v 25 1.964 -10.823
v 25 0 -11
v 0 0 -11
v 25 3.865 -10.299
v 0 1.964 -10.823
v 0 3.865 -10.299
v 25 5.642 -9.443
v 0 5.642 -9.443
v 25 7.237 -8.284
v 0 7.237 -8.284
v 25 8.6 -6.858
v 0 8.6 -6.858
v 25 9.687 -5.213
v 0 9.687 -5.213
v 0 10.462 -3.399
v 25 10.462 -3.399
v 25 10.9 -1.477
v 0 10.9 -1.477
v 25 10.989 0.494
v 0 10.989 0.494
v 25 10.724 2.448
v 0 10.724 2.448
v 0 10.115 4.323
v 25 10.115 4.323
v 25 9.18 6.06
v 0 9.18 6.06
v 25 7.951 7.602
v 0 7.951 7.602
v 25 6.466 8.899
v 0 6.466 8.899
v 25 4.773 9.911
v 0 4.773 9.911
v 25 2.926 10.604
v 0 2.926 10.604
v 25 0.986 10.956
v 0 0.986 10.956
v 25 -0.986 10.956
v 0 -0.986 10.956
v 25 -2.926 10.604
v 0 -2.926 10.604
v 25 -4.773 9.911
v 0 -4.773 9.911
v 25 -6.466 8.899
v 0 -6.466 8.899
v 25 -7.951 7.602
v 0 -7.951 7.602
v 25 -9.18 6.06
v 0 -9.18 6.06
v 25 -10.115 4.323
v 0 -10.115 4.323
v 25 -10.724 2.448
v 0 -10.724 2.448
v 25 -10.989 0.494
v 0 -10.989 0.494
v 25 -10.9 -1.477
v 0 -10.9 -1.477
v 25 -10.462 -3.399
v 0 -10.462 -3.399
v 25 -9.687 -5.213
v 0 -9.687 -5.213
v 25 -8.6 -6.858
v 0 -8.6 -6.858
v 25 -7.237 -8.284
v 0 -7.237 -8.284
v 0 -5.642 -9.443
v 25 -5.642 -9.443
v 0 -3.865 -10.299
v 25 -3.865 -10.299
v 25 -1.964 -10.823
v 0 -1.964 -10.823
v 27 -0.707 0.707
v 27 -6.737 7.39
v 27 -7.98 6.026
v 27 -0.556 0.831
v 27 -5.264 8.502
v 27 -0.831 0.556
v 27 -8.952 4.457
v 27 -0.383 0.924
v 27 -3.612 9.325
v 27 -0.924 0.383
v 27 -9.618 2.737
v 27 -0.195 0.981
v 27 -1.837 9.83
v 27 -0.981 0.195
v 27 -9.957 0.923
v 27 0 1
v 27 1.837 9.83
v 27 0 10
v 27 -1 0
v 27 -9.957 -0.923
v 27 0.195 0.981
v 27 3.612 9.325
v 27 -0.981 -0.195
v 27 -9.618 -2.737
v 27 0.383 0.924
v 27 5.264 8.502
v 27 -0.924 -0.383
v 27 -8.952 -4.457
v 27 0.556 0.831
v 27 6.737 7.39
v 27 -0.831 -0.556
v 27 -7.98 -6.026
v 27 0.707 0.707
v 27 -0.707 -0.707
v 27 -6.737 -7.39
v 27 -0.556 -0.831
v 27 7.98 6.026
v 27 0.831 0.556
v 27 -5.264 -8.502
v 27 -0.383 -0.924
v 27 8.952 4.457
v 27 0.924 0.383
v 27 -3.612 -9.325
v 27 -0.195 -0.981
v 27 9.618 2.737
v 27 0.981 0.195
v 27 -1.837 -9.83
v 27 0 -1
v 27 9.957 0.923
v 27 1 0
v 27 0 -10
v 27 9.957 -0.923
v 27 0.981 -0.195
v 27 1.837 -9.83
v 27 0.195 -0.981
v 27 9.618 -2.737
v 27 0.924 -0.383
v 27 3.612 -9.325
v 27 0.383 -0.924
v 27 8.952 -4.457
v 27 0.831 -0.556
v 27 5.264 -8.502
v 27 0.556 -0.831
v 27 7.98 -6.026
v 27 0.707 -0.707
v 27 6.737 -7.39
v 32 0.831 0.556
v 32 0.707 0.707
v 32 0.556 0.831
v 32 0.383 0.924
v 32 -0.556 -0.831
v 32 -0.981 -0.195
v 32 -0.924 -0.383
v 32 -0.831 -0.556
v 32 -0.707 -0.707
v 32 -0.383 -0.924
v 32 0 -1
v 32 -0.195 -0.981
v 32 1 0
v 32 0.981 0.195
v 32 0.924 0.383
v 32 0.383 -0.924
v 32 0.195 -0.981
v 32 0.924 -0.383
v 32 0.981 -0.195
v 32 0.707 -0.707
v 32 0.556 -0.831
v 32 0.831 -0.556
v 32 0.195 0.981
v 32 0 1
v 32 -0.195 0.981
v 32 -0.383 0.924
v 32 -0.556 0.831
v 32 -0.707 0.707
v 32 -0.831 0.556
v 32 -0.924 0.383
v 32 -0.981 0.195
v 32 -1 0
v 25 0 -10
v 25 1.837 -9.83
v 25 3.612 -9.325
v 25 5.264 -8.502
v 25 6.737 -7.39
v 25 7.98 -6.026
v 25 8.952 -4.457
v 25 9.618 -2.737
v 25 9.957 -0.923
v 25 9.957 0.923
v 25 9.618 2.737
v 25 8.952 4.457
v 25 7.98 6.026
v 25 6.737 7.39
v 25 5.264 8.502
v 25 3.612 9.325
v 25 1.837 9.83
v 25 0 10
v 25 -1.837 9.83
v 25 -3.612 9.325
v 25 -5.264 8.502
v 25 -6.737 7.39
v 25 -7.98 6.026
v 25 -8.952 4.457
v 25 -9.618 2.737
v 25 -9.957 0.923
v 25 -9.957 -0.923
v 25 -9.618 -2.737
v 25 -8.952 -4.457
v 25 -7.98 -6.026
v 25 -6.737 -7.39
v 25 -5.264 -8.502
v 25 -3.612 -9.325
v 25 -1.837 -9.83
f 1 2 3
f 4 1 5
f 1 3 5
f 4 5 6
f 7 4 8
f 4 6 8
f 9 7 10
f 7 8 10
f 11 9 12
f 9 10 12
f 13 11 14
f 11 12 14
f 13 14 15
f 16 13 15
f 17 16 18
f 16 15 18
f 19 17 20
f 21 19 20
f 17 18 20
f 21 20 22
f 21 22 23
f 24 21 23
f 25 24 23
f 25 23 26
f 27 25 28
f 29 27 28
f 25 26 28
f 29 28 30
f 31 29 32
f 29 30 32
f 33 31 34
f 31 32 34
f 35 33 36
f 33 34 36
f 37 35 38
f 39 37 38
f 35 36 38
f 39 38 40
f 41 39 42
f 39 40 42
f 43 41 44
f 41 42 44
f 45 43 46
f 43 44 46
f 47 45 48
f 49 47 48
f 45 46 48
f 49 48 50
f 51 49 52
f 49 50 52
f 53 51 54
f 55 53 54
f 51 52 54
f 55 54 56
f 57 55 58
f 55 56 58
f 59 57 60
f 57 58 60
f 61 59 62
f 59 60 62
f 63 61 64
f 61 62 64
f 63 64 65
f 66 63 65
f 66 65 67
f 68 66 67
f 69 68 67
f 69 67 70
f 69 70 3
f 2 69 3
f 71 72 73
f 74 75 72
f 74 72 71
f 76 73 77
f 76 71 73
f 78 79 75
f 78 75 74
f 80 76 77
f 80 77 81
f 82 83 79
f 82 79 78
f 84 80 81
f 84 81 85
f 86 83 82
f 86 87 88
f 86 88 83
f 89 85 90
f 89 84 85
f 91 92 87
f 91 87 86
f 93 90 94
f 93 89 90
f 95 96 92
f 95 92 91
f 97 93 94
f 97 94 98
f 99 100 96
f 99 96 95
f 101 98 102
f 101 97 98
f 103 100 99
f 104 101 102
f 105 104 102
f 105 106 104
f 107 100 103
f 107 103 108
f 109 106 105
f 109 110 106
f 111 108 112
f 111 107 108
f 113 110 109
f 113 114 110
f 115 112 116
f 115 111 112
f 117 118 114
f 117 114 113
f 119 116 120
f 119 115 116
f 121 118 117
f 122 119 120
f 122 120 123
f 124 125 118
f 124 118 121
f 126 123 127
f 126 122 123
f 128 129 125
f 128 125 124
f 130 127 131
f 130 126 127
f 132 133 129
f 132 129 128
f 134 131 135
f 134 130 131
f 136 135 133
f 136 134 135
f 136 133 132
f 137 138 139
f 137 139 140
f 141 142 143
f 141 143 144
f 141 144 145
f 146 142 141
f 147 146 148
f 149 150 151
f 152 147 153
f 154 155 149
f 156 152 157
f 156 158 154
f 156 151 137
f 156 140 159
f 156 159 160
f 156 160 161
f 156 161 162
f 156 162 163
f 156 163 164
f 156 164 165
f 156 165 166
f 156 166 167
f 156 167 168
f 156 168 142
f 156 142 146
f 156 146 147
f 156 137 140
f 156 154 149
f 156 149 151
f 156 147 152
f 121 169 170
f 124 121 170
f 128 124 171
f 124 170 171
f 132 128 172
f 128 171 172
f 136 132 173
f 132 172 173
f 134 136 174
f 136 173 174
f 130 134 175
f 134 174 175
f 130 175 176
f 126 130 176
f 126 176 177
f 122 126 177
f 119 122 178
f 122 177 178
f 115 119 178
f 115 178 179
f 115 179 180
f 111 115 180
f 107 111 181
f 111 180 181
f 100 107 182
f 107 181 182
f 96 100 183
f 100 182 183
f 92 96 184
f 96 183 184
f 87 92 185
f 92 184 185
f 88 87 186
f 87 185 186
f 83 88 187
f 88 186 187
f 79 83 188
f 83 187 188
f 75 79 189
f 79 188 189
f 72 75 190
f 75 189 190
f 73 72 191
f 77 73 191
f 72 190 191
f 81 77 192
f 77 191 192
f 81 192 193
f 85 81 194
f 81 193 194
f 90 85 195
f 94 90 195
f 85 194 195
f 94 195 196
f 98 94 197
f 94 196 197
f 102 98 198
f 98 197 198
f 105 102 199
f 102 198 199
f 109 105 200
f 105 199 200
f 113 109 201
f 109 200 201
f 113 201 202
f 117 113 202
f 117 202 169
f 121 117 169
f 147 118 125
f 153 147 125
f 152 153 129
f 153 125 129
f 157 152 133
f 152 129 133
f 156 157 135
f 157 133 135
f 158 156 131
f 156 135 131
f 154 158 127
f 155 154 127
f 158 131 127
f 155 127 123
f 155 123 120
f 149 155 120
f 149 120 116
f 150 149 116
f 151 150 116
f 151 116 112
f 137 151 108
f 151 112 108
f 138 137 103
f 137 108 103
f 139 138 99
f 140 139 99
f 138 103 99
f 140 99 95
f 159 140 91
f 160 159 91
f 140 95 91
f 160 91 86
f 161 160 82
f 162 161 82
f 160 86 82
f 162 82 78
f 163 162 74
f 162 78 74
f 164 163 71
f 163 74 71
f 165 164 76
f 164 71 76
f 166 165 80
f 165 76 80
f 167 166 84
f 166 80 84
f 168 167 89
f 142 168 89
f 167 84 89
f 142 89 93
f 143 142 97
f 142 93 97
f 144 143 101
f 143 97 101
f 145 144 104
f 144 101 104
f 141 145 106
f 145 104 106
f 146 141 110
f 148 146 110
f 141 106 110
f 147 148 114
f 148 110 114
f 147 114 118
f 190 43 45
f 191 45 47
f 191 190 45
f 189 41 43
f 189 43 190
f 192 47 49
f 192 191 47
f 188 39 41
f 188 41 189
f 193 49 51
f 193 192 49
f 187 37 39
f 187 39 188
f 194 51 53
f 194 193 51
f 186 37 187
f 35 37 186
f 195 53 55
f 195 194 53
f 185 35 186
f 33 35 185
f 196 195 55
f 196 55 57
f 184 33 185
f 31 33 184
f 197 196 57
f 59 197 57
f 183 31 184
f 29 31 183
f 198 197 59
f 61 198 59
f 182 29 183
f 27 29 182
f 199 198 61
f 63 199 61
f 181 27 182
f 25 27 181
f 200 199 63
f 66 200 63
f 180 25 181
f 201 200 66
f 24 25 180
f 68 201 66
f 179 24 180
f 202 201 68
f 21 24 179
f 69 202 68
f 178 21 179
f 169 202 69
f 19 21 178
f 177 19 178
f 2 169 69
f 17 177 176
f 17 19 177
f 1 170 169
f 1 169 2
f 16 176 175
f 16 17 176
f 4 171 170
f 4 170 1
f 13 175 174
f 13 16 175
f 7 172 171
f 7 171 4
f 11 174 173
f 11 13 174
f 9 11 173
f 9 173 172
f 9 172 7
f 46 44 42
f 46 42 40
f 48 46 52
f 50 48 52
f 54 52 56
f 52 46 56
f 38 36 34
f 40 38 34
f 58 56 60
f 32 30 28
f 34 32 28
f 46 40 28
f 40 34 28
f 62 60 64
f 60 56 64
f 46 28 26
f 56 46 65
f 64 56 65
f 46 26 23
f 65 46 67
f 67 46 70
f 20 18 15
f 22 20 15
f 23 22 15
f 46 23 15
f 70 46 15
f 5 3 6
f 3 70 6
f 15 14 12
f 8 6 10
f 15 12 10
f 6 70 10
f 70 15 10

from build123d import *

# Parameters (mm, degrees)
SKETCH1_R           = 11
BOSS_EXTRUDE1_DEPTH = 25
SKETCH2_R           = 10
BOSS_EXTRUDE2_DEPTH = 2
SKETCH3_R           = 1
BOSS_EXTRUDE3_DEPTH = 5


with BuildPart() as part:
    # Sketch1 → Boss-Extrude1 (new body)
    with BuildSketch(Plane(origin=(0, 0, 0), x_dir=(0, 0, -1), z_dir=(1, 0, 0))):
        Circle(SKETCH1_R)
    extrude(amount=BOSS_EXTRUDE1_DEPTH)

    # Sketch2 → Boss-Extrude2 (add)
    with BuildSketch(Plane(origin=(25, 0, 0), x_dir=(0, 0, -1), z_dir=(1, 0, 0))):
        Circle(SKETCH2_R)
    extrude(amount=BOSS_EXTRUDE2_DEPTH)

    # Sketch3 → Boss-Extrude3 (add)
    with BuildSketch(Plane(origin=(27, 0, 0), x_dir=(0, 0, -1), z_dir=(1, 0, 0))):
        Circle(SKETCH3_R)
    extrude(amount=BOSS_EXTRUDE3_DEPTH)


solid = part.part
